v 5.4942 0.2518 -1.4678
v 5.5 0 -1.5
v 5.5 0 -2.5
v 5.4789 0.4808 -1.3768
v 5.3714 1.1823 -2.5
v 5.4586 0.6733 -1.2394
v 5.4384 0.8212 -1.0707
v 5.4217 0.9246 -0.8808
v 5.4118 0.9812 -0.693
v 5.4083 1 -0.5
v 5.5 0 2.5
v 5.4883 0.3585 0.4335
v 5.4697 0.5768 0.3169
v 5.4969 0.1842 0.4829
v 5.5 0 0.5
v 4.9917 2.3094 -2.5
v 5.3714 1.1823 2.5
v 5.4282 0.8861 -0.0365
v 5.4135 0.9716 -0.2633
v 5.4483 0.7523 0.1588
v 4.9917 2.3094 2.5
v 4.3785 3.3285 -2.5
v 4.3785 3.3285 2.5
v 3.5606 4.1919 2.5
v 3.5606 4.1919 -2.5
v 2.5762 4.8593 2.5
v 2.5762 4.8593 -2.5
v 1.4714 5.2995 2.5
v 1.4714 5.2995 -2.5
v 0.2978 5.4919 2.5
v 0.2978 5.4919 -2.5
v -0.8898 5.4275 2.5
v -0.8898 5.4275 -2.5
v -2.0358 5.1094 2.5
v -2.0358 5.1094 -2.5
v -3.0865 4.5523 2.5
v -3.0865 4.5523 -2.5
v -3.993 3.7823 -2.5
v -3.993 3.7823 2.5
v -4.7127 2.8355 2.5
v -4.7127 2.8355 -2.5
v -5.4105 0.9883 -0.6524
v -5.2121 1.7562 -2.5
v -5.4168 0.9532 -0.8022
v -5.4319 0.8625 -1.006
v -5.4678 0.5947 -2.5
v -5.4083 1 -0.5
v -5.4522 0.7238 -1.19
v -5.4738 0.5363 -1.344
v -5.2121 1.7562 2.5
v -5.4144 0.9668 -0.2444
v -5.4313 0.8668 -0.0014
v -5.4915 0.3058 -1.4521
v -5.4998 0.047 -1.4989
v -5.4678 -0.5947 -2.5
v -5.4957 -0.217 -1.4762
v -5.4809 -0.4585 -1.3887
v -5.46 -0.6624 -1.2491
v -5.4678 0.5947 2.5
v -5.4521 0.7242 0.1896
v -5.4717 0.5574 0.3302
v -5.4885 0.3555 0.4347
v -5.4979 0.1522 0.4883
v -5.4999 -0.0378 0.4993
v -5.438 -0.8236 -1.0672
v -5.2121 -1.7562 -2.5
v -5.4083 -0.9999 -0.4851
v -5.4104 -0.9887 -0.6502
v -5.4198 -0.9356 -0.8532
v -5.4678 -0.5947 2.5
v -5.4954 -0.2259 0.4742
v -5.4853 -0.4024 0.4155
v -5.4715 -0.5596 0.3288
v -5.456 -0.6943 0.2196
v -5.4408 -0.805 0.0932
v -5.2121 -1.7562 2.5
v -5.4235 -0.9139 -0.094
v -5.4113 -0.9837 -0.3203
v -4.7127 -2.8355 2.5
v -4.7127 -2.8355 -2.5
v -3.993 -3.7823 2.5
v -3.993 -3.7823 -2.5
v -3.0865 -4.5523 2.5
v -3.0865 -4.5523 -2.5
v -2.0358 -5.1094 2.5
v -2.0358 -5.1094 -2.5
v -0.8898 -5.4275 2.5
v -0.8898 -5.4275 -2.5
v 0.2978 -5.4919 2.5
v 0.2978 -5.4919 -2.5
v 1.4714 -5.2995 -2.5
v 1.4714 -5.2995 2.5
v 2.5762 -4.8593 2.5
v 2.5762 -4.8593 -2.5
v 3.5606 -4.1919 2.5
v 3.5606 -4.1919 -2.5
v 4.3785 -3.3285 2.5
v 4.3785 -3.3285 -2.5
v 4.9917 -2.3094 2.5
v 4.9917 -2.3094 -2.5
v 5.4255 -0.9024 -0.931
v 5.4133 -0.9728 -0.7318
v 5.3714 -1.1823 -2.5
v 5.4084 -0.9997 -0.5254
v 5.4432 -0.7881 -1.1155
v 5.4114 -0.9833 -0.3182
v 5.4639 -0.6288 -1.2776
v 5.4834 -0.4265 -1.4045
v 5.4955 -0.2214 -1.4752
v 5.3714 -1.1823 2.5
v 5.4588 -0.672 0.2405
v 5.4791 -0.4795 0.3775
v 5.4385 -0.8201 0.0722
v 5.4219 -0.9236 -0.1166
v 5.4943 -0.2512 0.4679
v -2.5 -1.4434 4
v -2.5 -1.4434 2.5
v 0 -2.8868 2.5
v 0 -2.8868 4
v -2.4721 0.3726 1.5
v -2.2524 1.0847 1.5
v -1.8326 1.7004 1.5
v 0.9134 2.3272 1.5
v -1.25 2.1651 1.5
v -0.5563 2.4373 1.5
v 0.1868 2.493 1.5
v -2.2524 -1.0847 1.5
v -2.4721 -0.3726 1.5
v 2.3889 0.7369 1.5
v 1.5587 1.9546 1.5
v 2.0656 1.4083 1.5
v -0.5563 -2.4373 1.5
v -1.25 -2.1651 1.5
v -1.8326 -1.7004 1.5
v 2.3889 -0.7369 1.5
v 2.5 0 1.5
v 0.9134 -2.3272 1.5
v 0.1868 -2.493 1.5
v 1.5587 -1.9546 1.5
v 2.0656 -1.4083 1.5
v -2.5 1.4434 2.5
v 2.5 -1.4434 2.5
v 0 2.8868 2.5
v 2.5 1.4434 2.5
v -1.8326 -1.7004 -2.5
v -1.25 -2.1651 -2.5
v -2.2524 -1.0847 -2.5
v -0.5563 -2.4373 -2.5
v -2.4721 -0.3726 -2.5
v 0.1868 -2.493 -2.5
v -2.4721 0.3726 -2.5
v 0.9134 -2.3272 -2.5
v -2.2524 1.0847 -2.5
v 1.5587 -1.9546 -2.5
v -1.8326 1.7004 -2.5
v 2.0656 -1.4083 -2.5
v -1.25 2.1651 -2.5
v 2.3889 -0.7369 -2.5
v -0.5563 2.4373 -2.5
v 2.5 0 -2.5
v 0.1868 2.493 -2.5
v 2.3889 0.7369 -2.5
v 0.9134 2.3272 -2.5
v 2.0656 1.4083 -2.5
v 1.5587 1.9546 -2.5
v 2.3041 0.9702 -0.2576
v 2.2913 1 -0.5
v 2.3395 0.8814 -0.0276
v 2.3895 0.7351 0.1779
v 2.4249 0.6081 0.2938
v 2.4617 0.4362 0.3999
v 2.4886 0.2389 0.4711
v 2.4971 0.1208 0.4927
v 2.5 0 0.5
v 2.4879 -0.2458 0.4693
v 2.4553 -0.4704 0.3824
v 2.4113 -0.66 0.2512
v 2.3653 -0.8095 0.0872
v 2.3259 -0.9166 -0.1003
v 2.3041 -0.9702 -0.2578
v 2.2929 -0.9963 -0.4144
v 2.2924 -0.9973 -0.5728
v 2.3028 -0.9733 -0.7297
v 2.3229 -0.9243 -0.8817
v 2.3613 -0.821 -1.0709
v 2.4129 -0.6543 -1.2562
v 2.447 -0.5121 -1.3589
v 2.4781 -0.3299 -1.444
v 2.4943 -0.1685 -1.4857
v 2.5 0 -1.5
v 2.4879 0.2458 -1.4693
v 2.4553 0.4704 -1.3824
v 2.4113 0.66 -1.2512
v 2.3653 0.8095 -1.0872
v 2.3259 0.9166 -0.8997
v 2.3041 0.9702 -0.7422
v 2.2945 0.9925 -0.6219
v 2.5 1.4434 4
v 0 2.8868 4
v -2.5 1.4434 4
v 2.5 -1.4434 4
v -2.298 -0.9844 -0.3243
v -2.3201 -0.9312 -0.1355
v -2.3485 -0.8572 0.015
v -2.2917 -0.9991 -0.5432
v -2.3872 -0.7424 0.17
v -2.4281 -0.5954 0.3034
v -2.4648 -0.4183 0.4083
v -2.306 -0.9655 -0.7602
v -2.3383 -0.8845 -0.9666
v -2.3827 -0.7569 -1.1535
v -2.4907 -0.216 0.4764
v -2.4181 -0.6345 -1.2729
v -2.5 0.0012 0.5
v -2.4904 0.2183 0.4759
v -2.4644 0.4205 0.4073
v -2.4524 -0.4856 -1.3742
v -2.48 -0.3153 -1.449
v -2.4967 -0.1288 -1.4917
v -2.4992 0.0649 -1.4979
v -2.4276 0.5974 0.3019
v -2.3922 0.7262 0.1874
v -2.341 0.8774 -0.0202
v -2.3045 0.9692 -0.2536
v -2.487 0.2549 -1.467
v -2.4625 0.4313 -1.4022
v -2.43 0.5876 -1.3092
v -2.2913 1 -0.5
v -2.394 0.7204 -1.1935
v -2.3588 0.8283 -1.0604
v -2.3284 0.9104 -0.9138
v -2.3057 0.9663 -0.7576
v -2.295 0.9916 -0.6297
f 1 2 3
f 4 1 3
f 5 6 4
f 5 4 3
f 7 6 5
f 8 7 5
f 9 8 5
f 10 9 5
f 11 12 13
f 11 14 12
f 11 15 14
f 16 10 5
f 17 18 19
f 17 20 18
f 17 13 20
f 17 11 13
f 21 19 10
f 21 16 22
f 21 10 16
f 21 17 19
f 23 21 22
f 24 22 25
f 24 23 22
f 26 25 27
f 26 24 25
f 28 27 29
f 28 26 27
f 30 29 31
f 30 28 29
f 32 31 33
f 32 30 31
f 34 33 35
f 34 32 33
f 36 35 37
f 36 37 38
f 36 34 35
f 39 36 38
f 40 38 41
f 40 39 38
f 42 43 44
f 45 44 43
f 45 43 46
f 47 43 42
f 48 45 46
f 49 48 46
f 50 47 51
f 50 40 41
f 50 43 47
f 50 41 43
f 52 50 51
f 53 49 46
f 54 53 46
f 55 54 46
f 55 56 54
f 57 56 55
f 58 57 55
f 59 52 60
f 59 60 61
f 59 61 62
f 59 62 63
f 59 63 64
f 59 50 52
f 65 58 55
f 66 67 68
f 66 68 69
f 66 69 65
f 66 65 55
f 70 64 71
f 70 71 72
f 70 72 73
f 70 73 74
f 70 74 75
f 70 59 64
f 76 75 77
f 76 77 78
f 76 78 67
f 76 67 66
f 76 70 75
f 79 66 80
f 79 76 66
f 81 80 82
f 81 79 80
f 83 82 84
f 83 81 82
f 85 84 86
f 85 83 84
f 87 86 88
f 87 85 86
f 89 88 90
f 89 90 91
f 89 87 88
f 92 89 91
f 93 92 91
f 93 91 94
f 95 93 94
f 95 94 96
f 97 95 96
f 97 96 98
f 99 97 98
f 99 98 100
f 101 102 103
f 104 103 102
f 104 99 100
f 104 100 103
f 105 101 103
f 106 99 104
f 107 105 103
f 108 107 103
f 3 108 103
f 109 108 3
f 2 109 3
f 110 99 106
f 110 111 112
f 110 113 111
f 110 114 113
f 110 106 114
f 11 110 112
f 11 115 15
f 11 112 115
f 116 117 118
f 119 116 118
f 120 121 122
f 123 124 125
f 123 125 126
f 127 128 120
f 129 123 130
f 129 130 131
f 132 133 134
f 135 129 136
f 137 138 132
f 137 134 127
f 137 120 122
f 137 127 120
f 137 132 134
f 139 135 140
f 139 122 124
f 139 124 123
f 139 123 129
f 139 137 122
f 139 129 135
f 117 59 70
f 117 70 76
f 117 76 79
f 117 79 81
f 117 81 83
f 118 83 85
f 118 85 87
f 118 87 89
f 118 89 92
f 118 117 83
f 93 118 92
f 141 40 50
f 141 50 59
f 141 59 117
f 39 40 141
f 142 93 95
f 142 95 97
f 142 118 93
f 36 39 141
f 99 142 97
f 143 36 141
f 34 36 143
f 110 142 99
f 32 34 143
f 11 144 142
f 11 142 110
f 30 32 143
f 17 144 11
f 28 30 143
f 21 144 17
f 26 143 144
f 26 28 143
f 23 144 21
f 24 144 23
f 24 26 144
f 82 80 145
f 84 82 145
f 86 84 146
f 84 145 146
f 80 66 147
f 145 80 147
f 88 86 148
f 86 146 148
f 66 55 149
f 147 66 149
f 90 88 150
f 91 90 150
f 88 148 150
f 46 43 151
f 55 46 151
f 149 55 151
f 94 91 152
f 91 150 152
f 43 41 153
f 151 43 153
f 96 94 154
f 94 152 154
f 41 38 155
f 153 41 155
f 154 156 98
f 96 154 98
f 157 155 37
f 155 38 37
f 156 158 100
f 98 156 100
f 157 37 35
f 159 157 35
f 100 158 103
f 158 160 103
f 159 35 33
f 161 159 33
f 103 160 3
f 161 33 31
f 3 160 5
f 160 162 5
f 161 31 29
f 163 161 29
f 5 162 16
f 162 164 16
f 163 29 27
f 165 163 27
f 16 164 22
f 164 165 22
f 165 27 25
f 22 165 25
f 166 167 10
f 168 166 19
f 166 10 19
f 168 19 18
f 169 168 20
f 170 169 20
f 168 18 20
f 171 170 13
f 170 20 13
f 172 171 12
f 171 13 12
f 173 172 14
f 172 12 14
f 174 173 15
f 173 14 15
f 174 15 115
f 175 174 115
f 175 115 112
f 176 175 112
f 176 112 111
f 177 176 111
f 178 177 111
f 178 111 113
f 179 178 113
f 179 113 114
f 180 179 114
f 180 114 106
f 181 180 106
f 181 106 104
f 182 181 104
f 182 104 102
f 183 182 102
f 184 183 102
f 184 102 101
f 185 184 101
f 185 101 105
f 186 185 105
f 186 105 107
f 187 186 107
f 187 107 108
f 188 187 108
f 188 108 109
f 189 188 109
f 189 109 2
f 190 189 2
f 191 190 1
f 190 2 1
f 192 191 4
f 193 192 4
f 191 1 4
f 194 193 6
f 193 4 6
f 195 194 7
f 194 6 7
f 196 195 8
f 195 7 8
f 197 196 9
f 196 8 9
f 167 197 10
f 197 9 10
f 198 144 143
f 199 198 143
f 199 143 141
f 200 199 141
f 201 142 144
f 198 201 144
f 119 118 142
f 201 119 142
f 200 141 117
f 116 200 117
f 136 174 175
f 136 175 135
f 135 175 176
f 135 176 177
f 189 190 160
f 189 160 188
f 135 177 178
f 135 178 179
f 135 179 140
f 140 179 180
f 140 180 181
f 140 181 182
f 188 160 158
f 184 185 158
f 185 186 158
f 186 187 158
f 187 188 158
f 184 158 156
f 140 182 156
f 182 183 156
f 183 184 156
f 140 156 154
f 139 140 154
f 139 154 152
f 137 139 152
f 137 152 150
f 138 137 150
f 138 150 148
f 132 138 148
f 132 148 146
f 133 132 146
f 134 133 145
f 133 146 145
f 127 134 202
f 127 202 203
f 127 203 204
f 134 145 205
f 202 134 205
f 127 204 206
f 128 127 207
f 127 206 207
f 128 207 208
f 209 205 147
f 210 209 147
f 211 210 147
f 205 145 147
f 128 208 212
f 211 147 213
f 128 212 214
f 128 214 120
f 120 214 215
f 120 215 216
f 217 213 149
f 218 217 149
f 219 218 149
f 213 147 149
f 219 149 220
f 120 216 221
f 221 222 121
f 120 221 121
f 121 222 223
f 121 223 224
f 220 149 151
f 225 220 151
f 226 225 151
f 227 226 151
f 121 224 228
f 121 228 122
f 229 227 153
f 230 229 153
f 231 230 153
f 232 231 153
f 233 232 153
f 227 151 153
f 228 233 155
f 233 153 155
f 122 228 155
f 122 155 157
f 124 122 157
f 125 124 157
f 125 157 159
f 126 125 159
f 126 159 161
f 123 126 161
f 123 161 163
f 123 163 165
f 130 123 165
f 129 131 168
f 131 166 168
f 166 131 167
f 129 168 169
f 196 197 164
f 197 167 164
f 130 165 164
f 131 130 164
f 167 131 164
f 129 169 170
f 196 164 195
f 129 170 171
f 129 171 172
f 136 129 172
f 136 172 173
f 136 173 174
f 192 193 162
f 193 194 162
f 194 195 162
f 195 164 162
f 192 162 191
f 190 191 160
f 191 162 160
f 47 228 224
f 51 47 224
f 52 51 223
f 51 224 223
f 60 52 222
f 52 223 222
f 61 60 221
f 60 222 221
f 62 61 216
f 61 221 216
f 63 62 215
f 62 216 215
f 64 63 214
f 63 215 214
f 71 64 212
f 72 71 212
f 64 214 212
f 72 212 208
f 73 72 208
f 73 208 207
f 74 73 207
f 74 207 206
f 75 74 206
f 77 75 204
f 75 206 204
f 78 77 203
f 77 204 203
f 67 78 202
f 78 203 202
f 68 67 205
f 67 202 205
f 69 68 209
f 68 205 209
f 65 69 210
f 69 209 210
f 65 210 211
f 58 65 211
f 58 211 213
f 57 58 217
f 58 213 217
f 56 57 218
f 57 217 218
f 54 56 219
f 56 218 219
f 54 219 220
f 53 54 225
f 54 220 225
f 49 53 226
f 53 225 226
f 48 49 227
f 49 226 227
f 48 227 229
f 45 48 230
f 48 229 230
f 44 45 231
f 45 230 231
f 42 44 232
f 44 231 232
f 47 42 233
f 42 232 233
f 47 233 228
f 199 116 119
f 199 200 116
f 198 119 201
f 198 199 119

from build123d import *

# Parameters (mm, degrees)
F0_R     = 5.5
F1_DEPTH = 2.5
F3_DEPTH = 4
F4_R     = 1
F5_DEPTH = 50
F6_R     = 2.5
F7_DEPTH = 4


with BuildPart() as f1:
    # F0 (on Top) → F1 (new body, symmetric)
    with BuildSketch(Plane.XY):
        Circle(F0_R)
    extrude(amount=F1_DEPTH, both=True)

    # F2 (on Top) → F3 (join)
    with BuildSketch(Plane.XY):
        Polygon((-2.5, -1.443376), (0, -2.886751), (2.5, -1.443376), (2.5, 1.443376), (0, 2.886751), (-2.5, 1.443376), align=None)
    extrude(amount=F3_DEPTH)

    # F4 (on Right) → F5 (cut, symmetric)
    with BuildSketch(Plane.YZ):
        with Locations((0, -0.5)):
            Circle(F4_R)
    extrude(amount=F5_DEPTH, both=True, mode=Mode.SUBTRACT)

    # F6 (on face) → F7 (cut)
    with BuildSketch(Plane(origin=(0, 0, -2.5), x_dir=(1, 0, 0), z_dir=(0, 0, -1))):
        Circle(F6_R)
    extrude(amount=-F7_DEPTH, mode=Mode.SUBTRACT)


solid = f1.part
